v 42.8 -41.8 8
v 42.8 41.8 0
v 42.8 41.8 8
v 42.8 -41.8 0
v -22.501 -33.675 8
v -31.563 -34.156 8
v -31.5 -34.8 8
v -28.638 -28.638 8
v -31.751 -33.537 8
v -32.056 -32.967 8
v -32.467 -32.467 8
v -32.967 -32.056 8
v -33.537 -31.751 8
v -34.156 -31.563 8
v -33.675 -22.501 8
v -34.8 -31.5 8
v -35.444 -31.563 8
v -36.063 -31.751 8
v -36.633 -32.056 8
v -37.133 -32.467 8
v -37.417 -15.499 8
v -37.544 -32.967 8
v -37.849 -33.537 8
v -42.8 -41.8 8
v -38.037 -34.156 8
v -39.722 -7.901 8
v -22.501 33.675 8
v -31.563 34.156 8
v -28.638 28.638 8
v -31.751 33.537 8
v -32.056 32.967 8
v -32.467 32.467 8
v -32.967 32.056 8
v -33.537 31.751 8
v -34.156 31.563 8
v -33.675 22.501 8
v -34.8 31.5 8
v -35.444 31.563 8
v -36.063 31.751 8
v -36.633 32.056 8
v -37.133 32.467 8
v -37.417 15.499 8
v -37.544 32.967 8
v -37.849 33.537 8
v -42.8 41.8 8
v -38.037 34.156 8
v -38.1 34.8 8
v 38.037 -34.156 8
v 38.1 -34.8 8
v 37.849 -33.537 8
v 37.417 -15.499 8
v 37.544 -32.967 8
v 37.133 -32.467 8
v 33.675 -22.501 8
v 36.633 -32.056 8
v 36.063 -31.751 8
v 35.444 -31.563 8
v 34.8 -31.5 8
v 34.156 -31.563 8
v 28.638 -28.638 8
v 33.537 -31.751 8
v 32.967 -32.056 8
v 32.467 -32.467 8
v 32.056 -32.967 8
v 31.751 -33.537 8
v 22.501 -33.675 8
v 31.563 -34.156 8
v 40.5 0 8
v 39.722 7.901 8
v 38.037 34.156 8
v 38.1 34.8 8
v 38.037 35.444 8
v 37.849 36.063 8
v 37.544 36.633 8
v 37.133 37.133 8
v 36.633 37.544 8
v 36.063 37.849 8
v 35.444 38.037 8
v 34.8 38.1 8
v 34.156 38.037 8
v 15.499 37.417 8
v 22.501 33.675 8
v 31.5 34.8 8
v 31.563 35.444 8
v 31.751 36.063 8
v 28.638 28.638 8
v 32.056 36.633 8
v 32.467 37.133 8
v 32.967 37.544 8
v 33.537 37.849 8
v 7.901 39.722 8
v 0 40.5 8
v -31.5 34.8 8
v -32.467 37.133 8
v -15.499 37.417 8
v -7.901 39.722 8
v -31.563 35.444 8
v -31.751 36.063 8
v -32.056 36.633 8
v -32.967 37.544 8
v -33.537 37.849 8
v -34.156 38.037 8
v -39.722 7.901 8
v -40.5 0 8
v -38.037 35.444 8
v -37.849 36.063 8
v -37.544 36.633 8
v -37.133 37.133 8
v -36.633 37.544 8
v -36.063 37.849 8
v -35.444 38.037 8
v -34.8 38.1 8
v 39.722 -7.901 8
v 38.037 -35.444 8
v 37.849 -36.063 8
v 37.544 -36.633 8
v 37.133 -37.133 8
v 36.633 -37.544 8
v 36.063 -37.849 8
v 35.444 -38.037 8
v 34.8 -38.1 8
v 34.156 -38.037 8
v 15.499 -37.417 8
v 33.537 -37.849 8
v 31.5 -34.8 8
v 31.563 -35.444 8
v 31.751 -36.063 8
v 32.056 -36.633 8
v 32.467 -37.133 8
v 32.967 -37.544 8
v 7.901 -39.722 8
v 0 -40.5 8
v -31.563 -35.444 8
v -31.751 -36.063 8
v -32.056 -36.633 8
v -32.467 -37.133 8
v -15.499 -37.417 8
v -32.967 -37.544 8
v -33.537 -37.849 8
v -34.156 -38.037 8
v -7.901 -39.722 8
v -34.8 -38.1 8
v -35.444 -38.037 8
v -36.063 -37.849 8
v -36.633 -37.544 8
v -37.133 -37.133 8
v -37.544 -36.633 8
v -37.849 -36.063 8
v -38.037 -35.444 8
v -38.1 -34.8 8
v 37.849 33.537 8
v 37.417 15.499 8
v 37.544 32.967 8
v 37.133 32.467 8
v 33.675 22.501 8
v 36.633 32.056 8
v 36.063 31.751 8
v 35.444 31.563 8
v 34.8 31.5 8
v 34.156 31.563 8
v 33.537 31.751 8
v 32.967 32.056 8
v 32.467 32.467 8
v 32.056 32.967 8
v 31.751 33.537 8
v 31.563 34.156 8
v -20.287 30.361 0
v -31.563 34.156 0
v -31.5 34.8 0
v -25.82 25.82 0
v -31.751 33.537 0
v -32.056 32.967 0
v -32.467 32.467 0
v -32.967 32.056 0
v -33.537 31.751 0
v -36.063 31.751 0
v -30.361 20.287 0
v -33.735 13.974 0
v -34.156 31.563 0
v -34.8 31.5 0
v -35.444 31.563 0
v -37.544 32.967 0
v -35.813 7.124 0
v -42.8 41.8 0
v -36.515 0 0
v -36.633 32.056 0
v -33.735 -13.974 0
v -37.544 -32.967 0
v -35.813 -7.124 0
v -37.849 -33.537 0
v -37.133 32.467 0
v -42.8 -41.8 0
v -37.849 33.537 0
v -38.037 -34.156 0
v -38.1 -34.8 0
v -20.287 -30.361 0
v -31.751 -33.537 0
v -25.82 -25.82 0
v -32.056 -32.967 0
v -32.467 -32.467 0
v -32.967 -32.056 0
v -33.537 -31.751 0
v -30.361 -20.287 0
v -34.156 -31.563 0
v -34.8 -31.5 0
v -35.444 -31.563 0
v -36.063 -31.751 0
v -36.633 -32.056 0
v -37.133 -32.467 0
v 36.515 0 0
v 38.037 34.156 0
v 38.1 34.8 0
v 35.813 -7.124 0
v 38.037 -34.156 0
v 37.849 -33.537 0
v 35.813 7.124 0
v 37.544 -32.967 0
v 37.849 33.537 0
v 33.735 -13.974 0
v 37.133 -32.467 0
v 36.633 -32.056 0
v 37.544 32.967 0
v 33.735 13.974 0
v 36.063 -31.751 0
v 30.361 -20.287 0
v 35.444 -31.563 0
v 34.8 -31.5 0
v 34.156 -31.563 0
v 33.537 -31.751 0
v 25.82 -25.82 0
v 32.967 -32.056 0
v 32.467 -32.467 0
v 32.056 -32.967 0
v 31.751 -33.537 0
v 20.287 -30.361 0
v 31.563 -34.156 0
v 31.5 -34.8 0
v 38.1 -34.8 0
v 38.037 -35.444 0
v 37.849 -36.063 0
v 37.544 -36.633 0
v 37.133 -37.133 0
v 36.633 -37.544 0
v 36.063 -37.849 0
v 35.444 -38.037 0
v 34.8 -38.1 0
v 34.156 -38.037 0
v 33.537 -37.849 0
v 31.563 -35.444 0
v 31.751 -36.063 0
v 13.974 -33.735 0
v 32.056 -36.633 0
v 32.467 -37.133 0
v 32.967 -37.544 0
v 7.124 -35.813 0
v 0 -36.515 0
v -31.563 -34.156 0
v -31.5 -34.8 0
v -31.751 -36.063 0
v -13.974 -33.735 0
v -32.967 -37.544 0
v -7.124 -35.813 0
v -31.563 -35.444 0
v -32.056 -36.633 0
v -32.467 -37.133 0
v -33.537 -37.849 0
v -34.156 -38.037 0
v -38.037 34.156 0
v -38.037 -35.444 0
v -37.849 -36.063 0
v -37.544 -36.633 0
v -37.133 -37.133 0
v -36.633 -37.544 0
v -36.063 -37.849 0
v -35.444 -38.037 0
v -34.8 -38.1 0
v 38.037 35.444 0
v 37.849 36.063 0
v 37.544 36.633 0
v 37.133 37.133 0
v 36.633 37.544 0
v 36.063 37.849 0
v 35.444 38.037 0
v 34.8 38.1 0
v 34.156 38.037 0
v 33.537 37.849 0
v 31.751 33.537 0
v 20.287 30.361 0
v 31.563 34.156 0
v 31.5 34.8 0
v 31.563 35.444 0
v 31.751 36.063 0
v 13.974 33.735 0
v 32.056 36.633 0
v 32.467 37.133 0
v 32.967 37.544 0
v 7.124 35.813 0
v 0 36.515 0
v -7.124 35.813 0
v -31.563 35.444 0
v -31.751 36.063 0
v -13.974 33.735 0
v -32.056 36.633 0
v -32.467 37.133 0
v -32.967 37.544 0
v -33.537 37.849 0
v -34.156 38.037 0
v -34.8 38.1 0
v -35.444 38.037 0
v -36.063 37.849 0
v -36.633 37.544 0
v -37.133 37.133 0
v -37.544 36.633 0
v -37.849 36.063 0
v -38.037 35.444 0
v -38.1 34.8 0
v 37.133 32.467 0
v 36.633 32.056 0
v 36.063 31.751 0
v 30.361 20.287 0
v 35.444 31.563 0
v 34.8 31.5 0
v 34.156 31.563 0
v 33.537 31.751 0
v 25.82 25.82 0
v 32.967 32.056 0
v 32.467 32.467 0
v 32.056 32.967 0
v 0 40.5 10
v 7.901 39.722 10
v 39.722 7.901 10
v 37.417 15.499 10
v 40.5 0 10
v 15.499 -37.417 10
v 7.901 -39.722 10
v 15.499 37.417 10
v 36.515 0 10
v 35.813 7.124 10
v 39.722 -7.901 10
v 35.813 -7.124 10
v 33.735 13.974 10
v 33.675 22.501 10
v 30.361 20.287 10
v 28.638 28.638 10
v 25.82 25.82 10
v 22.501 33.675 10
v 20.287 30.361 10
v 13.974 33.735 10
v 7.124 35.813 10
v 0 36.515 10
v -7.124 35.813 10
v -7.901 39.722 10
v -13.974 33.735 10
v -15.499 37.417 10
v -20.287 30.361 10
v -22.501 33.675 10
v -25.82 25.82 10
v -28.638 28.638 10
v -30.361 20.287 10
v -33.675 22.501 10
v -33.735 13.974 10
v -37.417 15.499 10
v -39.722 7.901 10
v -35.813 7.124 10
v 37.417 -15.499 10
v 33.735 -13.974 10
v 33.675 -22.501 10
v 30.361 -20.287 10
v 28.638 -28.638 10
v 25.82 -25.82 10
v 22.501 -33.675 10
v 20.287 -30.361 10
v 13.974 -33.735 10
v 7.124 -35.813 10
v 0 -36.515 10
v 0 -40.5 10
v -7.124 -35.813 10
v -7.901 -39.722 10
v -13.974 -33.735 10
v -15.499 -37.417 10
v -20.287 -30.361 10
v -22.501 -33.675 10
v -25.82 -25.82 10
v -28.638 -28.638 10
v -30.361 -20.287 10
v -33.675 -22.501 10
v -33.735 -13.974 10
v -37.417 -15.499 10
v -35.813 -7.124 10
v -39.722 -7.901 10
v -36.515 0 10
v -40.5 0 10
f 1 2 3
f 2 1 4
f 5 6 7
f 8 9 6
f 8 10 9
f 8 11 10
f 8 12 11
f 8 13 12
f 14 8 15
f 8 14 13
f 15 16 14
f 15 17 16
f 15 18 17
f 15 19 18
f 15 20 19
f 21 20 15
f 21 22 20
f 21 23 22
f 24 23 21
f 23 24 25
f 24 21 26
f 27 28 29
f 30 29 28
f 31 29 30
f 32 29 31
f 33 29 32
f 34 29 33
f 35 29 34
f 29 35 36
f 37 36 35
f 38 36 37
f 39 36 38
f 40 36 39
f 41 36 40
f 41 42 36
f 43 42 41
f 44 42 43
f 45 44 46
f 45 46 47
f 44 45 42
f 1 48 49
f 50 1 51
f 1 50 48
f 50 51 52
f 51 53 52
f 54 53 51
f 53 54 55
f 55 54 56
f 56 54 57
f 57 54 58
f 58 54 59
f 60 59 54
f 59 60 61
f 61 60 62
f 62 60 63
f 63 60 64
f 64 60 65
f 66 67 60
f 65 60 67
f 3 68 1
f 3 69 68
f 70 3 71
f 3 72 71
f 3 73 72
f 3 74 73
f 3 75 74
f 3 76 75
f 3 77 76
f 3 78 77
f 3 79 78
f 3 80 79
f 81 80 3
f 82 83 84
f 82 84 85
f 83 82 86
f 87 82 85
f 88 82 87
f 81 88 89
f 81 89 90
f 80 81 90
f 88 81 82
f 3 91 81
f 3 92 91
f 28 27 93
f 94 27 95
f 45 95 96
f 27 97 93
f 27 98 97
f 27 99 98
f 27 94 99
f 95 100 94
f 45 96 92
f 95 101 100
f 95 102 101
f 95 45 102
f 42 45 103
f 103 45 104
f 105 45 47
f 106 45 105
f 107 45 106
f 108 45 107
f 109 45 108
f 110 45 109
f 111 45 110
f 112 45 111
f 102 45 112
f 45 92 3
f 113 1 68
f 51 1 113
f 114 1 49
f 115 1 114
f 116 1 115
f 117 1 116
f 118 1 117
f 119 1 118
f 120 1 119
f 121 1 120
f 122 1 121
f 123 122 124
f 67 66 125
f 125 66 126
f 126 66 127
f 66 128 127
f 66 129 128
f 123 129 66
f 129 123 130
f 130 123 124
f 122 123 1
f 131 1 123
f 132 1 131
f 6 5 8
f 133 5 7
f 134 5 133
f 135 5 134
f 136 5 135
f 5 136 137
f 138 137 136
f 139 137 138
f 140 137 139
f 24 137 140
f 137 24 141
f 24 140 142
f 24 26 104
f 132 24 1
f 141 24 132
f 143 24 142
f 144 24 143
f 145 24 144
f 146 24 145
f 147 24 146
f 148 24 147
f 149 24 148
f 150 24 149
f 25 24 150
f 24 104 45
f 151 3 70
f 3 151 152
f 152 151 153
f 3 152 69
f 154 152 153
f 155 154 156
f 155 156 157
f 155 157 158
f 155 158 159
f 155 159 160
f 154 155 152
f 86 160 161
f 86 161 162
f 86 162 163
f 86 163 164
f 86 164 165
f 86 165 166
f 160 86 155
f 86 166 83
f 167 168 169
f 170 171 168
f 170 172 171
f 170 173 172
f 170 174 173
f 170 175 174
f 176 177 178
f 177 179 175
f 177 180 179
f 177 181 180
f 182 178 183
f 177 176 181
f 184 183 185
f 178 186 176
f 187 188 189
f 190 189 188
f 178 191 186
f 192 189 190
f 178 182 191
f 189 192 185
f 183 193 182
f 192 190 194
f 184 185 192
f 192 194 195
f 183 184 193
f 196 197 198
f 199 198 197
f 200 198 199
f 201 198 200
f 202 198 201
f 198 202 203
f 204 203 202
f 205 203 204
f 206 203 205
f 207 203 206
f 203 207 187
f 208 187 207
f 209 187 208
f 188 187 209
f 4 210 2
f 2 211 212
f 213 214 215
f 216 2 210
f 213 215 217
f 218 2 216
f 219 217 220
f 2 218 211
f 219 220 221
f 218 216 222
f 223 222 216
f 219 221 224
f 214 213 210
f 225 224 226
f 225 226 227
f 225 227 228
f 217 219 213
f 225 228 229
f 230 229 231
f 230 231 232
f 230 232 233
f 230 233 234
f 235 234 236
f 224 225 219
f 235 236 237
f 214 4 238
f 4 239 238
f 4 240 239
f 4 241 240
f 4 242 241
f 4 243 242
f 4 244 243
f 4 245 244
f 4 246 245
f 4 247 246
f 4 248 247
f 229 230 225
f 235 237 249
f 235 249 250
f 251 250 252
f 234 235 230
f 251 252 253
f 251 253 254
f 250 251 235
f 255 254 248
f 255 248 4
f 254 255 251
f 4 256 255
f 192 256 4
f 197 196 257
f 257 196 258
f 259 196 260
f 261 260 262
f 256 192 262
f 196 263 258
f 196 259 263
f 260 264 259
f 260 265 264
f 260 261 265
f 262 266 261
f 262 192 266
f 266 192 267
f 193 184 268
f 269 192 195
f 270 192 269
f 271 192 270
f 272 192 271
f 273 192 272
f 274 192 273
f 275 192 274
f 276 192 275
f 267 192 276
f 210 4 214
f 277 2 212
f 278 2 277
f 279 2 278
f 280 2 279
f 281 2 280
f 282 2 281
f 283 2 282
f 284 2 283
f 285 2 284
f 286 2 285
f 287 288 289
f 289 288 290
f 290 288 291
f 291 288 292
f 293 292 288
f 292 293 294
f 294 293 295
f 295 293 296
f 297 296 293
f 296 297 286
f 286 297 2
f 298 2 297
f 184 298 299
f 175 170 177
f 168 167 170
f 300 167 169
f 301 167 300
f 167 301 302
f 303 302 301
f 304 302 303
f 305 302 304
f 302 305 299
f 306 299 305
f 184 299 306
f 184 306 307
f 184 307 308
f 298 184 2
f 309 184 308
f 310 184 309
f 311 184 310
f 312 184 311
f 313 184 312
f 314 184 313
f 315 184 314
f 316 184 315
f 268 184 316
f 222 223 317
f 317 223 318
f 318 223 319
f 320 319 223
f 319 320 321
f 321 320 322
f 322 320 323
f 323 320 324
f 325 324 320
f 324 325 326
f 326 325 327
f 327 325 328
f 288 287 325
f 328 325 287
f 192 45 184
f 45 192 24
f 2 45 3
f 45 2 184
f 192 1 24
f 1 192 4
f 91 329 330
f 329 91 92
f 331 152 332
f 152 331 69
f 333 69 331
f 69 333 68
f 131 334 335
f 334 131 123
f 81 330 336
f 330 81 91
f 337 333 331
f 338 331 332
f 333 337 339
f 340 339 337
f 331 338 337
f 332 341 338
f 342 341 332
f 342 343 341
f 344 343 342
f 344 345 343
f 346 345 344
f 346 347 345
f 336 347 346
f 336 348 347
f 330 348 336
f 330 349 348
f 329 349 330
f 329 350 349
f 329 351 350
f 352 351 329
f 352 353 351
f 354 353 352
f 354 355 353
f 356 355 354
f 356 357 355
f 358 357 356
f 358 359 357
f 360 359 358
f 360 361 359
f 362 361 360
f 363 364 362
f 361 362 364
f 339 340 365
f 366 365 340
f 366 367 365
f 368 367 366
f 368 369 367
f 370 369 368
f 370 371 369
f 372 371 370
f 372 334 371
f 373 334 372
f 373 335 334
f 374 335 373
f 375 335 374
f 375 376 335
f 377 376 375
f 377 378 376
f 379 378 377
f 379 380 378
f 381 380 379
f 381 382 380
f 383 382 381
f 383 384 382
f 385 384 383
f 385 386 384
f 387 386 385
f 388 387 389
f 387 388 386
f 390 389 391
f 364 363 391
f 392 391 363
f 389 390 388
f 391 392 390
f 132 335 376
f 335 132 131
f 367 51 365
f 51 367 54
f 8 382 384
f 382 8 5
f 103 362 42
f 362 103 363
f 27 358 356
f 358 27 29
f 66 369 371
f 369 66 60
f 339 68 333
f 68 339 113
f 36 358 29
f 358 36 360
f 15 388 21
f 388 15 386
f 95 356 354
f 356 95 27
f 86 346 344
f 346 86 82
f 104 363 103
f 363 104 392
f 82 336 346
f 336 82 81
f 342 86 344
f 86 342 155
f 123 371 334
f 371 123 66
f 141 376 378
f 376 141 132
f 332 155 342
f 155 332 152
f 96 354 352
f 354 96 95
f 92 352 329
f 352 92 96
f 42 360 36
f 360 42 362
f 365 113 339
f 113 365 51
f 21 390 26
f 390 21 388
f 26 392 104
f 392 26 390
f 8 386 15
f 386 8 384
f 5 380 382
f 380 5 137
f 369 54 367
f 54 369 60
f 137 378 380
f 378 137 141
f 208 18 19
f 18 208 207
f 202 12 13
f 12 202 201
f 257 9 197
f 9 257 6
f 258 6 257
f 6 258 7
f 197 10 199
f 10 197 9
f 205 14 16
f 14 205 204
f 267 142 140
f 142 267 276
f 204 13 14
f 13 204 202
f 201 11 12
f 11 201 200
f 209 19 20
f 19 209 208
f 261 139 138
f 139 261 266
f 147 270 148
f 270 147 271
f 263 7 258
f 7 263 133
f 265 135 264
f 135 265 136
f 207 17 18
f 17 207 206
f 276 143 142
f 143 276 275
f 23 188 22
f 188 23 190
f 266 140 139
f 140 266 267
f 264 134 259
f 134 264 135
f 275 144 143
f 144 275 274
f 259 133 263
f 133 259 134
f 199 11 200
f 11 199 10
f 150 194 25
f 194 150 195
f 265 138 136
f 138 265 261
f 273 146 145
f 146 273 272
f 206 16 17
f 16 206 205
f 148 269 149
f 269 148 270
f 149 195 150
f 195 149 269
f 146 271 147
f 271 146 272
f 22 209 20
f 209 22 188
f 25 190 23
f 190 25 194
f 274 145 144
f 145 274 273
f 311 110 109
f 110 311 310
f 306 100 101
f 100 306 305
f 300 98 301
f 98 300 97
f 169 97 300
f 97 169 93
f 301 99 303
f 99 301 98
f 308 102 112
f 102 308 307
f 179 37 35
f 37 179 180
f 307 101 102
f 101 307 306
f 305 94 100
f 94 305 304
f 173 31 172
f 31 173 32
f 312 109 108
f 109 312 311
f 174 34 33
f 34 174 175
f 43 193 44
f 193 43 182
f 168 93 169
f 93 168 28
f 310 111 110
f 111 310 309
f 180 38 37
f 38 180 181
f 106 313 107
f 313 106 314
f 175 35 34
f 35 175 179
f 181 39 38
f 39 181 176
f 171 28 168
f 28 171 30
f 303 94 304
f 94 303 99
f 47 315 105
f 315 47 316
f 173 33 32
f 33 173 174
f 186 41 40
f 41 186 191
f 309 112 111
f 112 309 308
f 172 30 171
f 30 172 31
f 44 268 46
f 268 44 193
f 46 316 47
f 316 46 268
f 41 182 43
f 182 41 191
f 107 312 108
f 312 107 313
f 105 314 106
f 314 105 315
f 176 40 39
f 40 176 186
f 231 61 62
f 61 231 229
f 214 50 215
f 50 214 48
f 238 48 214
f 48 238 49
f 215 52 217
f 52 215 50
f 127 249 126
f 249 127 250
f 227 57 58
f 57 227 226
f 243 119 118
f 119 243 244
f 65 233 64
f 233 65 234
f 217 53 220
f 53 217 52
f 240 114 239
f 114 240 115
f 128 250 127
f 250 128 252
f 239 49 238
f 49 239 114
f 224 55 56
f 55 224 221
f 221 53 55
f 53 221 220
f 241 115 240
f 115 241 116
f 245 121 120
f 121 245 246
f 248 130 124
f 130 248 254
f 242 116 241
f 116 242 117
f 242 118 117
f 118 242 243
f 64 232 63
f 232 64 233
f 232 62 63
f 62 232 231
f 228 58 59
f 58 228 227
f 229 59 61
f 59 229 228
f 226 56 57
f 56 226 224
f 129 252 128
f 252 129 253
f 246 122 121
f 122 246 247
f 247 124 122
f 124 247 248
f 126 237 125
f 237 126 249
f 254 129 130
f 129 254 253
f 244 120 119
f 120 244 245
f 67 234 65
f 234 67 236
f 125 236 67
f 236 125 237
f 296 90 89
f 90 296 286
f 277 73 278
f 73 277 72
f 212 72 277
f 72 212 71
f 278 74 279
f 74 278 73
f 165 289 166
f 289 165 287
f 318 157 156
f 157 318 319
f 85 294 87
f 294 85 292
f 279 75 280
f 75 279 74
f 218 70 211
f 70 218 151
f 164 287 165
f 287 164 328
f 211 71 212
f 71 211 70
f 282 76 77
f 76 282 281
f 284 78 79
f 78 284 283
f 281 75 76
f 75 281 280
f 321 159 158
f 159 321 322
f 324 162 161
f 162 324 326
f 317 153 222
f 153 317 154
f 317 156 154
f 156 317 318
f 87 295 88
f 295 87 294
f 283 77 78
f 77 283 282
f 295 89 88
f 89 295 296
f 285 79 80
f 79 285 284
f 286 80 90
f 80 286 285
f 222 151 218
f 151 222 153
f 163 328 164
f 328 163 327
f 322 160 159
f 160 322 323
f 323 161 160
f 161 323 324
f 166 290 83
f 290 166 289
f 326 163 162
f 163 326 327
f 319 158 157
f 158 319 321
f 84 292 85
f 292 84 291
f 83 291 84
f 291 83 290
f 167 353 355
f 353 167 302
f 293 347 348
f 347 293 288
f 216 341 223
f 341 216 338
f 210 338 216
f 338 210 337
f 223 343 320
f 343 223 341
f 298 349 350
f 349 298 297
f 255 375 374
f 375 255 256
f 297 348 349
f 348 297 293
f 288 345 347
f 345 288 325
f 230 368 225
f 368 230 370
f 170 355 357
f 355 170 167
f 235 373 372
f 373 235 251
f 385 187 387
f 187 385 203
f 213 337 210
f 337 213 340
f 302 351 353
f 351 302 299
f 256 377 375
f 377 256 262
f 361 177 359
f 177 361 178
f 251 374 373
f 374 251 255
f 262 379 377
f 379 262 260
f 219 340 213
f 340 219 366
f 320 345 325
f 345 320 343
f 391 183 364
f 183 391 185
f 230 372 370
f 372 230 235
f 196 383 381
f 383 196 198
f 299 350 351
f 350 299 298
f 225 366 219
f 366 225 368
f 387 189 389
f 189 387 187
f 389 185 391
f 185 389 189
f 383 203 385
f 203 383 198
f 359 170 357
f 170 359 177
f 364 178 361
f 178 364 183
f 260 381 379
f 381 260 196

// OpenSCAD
$fn = 32;

// ----------------------------------------------------------------------
// Motor mount plate: NEMA34, 85.6 x 83.6 x 10 mm
// ----------------------------------------------------------------------

// --- parameters (mm) ---
mount_w = 85.6;           // plate length, X
mount_d = 83.6;           // plate width, Y
mat_t = 8;                // plate thickness
motor_pitch = 69.6;       // NEMA34 bolt spacing
motor_d = 6.6;            // NEMA34 screw clearance
center_bore = 73.03;      // pilot boss bore
boss_d = 81;              // raised pilot ring
boss_h = 2;               // raised pilot ring height

module plate() {
  translate([-mount_w / 2, -mount_d / 2, 0]) cube([mount_w, mount_d, mat_t]);
}

module motor_holes() {
  for (sx = [-1, 1]) for (sy = [-1, 1])
    translate([sx * motor_pitch / 2, sy * motor_pitch / 2, -1])
      cylinder(h = mat_t + 2, d = motor_d);
}
module pilot_ring() {
  translate([0, 0, mat_t - 1]) cylinder(h = boss_h + 1, d = boss_d);
}

difference() {
  union() {
    plate();
    pilot_ring();
  }
  motor_holes();
  translate([0, 0, -1]) cylinder(h = mat_t + boss_h + 2, d = center_bore);
}
